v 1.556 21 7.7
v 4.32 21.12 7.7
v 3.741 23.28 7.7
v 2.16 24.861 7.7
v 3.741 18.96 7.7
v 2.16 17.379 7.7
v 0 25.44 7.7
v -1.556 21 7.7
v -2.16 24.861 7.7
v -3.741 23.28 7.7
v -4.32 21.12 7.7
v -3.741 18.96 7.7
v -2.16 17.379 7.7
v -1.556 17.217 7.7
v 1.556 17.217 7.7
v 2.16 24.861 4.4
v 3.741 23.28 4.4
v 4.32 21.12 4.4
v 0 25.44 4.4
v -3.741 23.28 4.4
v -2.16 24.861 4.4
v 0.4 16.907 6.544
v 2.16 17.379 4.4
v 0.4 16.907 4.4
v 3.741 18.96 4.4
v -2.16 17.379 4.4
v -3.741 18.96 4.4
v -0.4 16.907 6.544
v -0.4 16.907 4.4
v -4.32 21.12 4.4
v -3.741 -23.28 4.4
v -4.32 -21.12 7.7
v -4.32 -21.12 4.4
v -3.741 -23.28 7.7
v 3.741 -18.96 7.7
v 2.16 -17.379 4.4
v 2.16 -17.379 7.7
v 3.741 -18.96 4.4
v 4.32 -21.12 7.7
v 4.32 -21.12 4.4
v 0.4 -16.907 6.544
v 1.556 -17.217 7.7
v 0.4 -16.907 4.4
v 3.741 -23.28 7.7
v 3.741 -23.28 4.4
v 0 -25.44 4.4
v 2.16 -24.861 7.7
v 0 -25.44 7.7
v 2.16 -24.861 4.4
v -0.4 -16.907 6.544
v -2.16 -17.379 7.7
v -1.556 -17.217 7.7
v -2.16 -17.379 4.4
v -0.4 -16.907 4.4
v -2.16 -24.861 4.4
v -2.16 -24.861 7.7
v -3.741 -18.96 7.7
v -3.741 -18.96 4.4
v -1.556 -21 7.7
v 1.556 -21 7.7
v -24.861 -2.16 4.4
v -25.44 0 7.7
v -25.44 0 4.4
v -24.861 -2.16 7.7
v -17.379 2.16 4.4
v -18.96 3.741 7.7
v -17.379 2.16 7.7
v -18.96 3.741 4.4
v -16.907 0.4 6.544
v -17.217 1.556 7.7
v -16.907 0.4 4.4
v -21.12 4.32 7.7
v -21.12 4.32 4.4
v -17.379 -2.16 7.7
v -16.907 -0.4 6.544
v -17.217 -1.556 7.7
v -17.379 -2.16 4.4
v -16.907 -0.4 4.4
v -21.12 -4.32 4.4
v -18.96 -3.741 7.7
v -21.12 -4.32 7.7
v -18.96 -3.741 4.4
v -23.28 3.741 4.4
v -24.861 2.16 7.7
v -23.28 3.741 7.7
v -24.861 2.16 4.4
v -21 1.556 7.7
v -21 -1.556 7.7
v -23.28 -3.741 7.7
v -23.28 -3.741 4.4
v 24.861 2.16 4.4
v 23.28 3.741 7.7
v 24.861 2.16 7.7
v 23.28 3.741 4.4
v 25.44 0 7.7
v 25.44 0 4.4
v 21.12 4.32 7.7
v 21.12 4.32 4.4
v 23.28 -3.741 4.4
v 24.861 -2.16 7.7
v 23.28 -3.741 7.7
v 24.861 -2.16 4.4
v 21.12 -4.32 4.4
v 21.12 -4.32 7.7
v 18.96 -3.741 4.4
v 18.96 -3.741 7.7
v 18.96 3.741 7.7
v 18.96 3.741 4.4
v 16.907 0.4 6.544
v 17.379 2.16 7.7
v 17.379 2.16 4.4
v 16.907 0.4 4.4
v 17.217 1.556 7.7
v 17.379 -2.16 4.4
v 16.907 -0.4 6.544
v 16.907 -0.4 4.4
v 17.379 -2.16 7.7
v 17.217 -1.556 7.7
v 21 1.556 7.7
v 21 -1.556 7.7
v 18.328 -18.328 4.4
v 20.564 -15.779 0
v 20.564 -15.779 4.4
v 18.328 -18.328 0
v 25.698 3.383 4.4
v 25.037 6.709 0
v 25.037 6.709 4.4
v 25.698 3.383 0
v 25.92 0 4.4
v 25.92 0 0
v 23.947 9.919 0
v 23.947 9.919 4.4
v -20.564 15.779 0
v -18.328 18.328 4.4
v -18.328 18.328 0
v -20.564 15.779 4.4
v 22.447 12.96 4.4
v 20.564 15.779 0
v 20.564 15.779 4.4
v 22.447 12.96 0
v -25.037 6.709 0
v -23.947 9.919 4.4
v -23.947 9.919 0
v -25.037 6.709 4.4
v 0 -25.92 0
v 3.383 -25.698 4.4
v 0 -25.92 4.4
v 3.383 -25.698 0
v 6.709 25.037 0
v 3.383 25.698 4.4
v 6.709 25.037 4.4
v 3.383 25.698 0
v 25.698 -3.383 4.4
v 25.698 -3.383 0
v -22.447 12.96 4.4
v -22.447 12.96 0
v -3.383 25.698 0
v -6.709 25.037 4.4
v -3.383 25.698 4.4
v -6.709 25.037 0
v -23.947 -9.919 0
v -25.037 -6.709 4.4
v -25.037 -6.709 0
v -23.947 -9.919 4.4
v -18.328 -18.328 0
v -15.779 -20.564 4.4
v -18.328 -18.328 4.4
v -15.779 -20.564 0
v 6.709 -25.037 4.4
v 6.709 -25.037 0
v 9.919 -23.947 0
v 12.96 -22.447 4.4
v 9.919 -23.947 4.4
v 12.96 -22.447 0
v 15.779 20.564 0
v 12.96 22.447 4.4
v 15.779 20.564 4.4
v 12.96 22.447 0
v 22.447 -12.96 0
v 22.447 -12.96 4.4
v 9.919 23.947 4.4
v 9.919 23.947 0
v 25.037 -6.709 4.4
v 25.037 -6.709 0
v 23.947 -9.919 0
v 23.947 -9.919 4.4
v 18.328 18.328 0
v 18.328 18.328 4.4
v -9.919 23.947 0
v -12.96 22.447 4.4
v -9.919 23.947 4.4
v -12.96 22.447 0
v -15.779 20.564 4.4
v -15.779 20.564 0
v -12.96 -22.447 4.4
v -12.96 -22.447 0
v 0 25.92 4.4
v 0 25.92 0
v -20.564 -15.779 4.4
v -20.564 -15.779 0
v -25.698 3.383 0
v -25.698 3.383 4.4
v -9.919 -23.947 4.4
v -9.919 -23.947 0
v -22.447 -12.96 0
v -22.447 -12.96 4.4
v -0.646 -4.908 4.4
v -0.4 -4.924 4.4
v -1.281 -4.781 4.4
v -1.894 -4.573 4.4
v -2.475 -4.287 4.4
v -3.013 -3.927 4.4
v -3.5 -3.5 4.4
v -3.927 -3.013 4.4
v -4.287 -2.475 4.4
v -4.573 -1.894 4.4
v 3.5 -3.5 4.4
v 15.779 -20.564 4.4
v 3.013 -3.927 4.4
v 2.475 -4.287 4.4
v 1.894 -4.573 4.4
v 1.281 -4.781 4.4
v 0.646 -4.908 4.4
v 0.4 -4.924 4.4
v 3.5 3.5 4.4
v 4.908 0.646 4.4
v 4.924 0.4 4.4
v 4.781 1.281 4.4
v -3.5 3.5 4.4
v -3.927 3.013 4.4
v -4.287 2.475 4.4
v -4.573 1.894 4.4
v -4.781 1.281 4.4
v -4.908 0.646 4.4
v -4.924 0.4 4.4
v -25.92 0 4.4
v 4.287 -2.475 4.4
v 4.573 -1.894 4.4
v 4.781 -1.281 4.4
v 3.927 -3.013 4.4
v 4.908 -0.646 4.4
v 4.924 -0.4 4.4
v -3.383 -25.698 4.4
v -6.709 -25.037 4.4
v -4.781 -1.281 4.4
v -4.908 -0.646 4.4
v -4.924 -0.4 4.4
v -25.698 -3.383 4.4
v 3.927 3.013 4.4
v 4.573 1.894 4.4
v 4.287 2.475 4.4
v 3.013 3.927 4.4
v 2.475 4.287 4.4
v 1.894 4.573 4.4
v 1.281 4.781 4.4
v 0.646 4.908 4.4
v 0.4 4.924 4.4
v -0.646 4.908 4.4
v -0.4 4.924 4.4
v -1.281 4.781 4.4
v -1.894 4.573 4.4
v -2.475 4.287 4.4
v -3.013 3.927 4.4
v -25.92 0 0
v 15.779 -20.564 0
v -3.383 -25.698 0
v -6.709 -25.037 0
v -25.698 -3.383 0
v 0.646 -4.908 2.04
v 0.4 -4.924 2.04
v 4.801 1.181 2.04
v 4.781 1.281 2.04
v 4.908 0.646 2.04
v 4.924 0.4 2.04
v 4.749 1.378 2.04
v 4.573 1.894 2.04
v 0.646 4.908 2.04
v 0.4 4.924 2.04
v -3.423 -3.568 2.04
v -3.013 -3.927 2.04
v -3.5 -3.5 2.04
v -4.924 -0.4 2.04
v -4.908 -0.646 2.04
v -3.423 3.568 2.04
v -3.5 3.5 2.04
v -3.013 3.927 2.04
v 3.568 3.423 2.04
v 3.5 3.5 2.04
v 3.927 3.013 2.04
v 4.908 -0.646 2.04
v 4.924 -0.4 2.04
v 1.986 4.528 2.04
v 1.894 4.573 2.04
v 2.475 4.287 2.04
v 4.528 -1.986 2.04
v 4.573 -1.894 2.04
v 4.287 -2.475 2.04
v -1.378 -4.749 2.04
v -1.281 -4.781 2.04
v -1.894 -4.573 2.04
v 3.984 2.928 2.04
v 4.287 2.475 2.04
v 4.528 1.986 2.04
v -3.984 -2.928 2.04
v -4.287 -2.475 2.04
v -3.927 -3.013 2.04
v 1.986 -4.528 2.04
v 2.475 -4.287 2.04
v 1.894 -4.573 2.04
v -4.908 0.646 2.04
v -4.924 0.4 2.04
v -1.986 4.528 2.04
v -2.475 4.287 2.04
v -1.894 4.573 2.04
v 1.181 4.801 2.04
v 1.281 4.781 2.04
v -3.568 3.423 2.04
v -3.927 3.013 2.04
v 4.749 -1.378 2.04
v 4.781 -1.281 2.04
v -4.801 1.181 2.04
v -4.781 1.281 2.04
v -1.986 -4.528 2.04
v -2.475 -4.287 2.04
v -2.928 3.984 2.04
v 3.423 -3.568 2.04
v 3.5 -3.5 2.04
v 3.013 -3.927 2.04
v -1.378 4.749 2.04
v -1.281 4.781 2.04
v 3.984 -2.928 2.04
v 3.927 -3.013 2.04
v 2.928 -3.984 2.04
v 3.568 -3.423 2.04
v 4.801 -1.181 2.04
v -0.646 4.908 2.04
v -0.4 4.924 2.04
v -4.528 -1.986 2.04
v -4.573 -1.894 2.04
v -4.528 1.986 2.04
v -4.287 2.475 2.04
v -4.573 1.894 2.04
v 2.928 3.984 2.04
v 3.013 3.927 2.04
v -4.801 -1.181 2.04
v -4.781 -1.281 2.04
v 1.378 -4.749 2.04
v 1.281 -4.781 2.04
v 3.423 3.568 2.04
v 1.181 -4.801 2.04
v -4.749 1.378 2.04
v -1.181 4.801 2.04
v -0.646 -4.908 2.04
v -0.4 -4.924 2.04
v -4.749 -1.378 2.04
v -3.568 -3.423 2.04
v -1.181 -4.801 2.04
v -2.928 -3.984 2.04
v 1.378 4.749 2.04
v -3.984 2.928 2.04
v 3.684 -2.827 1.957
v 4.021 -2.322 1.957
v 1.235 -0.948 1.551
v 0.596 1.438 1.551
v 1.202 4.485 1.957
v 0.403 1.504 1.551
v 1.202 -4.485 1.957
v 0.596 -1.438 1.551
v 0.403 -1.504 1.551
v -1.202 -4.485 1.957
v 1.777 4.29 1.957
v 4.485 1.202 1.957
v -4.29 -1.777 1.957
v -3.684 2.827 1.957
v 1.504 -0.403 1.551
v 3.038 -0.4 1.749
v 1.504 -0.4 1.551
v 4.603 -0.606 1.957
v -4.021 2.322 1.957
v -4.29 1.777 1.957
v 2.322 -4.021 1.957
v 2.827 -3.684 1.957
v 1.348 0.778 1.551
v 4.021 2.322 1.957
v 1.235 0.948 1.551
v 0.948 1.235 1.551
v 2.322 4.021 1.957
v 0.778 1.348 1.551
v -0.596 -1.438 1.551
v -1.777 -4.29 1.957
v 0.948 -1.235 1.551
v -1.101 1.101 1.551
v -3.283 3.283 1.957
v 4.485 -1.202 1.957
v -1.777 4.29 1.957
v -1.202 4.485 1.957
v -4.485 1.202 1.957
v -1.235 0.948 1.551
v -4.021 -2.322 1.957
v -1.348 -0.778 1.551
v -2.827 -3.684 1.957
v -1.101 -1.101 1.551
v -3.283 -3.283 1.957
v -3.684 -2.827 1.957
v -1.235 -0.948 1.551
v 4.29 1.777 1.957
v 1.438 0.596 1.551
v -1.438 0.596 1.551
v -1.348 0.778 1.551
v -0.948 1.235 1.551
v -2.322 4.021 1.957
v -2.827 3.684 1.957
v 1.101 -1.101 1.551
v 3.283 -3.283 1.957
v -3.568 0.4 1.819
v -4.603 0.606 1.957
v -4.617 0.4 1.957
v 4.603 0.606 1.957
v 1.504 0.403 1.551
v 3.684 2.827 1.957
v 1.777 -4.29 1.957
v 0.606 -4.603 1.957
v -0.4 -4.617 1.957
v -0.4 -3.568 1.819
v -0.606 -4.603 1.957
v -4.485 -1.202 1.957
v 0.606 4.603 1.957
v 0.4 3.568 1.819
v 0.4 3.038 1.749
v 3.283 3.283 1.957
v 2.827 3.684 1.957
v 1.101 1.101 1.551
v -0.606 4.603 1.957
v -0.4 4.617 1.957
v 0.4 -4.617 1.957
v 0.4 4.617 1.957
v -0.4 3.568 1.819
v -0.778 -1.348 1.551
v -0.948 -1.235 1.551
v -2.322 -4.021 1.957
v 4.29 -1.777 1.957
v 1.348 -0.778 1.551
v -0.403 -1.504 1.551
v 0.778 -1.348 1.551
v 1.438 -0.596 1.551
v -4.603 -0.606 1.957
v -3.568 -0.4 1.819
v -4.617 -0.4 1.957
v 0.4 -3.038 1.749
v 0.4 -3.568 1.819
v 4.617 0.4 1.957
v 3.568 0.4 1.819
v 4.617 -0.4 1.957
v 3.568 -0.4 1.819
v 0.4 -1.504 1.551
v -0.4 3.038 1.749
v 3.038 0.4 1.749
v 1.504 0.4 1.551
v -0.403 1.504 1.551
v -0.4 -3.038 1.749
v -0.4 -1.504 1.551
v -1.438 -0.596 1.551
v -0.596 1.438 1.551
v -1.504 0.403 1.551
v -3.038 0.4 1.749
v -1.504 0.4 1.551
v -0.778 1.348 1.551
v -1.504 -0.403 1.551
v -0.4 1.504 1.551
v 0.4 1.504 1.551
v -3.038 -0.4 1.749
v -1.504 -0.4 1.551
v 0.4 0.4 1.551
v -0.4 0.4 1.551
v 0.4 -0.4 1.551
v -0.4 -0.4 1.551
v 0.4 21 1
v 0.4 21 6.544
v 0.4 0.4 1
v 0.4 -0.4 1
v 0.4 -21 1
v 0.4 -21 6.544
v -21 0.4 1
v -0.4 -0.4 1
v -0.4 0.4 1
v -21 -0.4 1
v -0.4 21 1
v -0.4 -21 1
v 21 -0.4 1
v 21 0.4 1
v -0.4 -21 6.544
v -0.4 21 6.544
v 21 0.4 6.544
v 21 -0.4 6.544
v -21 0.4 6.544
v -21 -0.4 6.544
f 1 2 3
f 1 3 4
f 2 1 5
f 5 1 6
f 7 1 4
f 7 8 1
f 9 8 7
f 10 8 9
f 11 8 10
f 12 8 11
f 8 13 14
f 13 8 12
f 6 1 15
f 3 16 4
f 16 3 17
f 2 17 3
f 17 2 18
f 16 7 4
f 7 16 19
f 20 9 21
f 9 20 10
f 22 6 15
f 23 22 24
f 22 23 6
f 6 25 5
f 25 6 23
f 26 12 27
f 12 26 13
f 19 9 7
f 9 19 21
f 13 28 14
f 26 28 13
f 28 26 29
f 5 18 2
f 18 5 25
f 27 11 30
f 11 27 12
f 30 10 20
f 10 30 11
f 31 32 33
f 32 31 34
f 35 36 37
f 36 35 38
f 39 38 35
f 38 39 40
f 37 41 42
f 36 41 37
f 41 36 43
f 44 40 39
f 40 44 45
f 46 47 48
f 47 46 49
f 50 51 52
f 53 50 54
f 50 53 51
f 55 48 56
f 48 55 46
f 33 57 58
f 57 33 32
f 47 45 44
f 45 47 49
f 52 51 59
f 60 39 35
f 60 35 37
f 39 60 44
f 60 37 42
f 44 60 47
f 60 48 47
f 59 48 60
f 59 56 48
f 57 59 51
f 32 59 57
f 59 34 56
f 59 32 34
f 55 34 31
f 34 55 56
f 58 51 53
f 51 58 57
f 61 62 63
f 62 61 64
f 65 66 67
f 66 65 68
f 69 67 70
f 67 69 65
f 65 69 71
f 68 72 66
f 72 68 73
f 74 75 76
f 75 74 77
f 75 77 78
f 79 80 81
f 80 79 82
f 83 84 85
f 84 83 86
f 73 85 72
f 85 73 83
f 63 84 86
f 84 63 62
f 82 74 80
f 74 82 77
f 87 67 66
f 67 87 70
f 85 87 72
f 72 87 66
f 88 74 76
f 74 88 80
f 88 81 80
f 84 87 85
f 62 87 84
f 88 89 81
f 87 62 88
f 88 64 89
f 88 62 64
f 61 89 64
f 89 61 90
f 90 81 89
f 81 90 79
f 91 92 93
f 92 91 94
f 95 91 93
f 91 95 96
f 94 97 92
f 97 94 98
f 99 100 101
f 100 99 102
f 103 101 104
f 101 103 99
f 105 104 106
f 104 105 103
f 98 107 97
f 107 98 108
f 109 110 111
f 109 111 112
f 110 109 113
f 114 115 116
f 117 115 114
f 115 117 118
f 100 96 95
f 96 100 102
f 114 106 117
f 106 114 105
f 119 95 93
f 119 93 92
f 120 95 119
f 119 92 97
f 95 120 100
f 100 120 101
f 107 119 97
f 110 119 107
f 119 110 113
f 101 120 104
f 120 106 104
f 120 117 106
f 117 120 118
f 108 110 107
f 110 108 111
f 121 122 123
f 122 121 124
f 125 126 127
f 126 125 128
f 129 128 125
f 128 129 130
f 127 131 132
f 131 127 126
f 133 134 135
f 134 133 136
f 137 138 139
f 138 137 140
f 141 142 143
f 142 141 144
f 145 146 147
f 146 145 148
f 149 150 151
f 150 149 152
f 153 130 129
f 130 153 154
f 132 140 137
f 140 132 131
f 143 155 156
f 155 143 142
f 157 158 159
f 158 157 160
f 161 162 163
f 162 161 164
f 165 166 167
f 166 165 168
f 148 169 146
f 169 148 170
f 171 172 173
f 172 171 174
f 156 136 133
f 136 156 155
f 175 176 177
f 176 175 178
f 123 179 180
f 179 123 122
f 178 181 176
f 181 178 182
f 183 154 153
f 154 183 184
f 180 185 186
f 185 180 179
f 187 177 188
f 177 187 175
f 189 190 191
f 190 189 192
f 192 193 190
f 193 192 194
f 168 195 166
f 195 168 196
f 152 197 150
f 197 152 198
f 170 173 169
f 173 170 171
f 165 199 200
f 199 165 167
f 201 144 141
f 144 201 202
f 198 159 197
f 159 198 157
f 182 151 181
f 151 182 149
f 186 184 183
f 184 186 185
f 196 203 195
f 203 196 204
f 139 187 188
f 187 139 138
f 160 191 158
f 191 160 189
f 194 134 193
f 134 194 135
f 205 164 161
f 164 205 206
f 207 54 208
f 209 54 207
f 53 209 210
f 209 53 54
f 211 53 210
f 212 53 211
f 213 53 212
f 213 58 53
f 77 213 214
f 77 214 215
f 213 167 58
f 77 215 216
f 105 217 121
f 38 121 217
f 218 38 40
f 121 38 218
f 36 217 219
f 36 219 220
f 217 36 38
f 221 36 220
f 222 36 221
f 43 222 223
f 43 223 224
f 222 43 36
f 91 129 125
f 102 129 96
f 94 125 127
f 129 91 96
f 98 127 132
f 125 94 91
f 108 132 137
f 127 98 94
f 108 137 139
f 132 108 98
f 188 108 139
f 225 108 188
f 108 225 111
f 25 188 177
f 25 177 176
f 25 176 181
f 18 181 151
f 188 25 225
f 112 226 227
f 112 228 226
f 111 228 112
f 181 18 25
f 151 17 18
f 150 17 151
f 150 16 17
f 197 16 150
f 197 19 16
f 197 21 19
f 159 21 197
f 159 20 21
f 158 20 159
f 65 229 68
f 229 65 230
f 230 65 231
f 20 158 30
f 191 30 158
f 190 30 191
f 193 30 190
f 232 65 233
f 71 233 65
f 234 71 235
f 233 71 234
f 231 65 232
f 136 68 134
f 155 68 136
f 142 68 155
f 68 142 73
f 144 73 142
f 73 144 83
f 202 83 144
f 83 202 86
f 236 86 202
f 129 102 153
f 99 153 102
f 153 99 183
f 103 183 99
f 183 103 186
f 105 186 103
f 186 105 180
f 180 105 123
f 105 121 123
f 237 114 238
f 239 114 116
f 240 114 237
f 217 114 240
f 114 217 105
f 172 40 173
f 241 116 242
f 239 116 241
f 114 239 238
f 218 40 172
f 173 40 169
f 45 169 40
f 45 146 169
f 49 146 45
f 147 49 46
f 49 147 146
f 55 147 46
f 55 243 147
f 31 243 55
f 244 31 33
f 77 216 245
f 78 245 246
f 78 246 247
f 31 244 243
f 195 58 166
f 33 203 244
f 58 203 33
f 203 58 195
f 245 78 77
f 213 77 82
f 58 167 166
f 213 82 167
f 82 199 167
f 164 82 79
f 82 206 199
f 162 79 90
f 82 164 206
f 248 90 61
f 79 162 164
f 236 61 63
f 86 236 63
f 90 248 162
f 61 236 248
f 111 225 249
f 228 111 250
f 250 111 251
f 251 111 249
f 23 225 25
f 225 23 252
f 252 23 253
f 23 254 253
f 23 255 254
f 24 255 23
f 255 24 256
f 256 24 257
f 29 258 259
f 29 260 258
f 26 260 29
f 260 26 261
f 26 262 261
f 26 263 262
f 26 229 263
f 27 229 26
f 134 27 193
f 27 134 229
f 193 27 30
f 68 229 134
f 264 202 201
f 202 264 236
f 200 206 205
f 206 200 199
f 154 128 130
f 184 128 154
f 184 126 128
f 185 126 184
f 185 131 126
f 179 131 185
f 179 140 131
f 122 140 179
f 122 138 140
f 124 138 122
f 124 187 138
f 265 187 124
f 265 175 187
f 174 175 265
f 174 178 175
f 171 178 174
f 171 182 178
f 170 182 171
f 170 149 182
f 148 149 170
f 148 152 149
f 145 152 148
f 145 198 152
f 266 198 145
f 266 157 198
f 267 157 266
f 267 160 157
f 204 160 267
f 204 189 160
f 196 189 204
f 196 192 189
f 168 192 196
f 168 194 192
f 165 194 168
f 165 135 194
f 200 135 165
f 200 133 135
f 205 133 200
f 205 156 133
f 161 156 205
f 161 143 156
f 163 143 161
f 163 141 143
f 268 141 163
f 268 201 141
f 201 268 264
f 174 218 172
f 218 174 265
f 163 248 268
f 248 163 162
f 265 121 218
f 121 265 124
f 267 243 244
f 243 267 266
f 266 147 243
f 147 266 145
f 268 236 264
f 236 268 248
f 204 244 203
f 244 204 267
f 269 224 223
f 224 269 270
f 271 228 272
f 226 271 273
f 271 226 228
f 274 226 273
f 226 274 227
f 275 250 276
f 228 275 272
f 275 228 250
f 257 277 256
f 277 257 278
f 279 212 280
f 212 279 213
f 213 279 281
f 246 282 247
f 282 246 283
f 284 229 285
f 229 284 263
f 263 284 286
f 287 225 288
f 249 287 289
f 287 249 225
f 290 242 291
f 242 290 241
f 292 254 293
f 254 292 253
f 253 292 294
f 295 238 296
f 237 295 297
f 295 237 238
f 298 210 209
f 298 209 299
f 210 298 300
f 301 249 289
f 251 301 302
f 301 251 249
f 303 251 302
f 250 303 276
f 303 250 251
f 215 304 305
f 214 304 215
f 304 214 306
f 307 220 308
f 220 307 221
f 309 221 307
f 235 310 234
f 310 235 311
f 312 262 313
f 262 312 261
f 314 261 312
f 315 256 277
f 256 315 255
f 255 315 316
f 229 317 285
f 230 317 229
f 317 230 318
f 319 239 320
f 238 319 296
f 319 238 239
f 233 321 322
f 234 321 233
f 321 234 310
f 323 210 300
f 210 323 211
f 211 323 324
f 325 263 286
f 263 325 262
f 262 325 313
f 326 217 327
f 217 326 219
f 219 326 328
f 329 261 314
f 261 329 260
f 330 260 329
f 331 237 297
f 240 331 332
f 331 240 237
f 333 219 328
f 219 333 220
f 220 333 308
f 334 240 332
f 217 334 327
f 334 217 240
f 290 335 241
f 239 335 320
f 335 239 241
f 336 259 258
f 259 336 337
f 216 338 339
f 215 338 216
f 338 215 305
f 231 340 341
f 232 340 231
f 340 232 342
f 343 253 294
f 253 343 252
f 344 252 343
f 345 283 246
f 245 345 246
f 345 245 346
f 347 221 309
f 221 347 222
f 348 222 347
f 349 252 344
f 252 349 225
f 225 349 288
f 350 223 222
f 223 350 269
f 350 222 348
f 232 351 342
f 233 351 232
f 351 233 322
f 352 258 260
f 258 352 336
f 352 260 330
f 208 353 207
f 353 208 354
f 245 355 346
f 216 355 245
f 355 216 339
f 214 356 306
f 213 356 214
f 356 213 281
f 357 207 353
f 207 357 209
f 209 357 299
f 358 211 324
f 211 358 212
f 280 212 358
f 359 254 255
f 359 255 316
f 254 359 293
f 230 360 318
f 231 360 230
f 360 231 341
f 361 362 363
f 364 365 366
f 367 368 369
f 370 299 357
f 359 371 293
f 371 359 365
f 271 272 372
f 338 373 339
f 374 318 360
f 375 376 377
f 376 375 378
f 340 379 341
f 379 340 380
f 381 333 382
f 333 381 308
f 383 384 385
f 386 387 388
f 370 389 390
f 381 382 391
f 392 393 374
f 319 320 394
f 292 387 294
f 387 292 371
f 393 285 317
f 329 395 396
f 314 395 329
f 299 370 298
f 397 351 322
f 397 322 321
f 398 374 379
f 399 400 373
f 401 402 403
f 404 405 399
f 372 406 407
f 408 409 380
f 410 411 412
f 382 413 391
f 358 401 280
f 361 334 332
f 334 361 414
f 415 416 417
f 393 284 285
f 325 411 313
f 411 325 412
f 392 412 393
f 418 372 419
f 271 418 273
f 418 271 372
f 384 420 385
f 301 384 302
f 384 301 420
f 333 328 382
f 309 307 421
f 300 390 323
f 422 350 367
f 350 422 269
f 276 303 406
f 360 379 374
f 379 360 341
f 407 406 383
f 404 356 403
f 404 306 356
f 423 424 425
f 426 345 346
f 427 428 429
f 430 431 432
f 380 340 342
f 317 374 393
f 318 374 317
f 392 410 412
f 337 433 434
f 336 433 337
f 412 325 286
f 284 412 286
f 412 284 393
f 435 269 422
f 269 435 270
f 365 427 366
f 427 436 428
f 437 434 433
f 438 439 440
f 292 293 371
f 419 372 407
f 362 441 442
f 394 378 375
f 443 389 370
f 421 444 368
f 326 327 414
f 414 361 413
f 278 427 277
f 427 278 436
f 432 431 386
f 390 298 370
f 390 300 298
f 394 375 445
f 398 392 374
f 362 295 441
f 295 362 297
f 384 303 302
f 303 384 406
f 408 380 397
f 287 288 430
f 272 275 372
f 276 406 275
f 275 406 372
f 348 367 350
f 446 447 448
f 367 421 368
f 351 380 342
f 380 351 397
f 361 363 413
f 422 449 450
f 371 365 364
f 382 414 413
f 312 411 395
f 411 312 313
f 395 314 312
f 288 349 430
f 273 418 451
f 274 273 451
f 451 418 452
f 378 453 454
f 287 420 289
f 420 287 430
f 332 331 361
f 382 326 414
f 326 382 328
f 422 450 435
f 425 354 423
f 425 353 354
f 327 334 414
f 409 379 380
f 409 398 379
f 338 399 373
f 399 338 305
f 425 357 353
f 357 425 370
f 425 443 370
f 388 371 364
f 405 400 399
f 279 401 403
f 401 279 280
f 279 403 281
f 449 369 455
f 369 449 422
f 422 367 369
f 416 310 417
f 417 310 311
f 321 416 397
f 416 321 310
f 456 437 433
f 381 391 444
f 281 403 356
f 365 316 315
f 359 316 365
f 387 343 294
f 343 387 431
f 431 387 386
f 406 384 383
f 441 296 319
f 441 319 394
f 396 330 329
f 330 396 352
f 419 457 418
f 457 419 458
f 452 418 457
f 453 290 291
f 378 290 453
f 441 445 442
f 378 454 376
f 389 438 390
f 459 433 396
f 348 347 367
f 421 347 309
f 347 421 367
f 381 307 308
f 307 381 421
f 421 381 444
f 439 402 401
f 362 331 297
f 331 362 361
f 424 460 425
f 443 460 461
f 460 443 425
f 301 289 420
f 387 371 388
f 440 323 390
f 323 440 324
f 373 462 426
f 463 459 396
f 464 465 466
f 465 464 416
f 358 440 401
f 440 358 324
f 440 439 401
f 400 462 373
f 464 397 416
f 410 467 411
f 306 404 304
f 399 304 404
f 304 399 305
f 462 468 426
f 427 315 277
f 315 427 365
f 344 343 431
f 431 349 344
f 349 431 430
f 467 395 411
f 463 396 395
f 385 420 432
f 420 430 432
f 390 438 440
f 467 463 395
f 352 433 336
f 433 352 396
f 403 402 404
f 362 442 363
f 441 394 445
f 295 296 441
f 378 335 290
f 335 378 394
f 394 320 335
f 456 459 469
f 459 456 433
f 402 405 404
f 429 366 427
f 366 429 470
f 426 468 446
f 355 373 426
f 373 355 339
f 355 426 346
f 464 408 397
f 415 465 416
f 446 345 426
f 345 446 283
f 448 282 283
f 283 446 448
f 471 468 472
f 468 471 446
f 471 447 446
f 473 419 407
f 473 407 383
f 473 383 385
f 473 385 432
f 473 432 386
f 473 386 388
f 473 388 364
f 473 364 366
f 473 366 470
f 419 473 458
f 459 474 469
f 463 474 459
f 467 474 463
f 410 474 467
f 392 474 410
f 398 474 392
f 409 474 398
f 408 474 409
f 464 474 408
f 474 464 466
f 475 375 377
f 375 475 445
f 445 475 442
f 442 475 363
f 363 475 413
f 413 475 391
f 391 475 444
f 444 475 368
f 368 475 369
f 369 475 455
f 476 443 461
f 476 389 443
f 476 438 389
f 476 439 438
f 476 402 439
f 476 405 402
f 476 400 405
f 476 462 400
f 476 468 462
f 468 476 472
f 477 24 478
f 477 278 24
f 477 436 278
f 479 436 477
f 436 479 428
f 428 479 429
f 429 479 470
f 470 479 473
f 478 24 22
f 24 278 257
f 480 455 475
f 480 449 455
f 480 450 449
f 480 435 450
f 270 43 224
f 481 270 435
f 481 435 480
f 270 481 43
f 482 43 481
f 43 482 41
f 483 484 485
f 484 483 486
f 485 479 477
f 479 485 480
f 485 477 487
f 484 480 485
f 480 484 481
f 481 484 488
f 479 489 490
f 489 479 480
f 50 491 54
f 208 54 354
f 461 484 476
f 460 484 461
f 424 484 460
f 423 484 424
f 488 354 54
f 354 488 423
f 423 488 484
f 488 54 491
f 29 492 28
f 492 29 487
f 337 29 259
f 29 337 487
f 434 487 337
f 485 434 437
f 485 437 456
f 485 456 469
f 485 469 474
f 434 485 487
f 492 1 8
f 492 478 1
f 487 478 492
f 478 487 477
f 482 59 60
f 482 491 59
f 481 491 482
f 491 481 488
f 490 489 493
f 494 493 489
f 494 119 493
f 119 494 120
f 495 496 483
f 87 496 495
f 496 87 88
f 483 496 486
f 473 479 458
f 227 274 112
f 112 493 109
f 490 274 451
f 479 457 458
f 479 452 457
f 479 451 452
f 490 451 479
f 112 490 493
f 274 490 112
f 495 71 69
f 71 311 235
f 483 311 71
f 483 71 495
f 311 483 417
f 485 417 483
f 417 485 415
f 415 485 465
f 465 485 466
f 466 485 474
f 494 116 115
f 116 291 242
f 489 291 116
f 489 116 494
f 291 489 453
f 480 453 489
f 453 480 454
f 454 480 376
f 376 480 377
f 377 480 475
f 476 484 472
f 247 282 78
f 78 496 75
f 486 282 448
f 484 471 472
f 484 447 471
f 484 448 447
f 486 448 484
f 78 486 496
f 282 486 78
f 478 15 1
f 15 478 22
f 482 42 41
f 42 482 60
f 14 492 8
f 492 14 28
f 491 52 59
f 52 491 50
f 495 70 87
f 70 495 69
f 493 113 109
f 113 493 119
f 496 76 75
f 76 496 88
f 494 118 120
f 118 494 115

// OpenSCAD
// [FL_INDEX: keywords="openscad, 3d_parametric, Pill_cutting_board, csg_solid" | COT="Parametric OpenSCAD design from 3DCodeverse"]
// Title: Pill cutting board

//Pill diameter
pd=9.6;//

//Pill hight1 
pt=4.2;//

//Pill hight2
pt2=2.6;

//Brade gap
bg=0.8;//

//Gap taper offset
gto=2.2; //

//Parts sellect
part="base";//[pill,base]  

pc=(pt-pt2)/2;//Convex value
sp=pd/(tan(2*atan(2*pc/pd))*2)+pd;// convex diameter

//Base hight
bh=pt2+(pt-pt2)/2+1;

echo(sp);// convex diameter
echo(pd+0.4);

module pill()
{
rotate([0,0,0])intersection(){
cylinder(h=20,r=pd/2+0.15,center=true,$fn=48);
translate([0,0,-sp+(pt2/2+0.2)])sphere(r=sp+0.2,center=true,$fn=48);
translate([0,0,sp-(pt2/2+0.2)])sphere(r=sp+0.2,center=true,$fn=48);
								}
}

module post2()
{
translate([0,pd*2.2,bh])cylinder(h=bh*1.5,r=pd*0.45 ,center=true,$fn=12);
translate([0,-pd*2.2,bh])cylinder(h=bh*1.5,r=pd*0.45 ,center=true,$fn=12);
translate([-pd*2.2,0,bh])cylinder(h=bh*1.5,r=pd*0.45 ,center=true,$fn=12);
translate([pd*2.2,0,bh])cylinder(h=bh*1.5,r=pd*0.45 ,center=true,$fn=12);
}

module post3()
{
translate([0,18,bh])cylinder(h=bh*2,r=pd*0.45 ,center=true,$fn=12);
translate([0,-18,bh])cylinder(h=bh*2,r=pd*0.45 ,center=true,$fn=12);
translate([-18,0,bh])cylinder(h=bh*2,r=pd*0.45 ,center=true,$fn=12);
translate([18,0,bh])cylinder(h=bh*2,r=pd*0.45 ,center=true,$fn=12);
}

if(part=="pill") {
		translate([0,0,0])pill();
				 }
else if (part=="base"){
	
	difference(){
			union(){ 
					translate([0,0,bh/2])cylinder(h=bh,r=pd*2.7 ,center=true,$fn=48);

					translate([0,0,0])post2();
					}
	translate([0,0,bh/2+1])pill();
	translate([0,0,bh])pill();
	translate([-bg/2,-21,1])cube(size=[bg,42,20], center=false);
	translate([-21,-bg/2,1])cube(size=[42,bg,20], center=false);
	translate([0,0,bh*gto])rotate([0,45,0])cube(size=[5,42,5], center=true);
	translate([0,0,bh*gto])rotate([45,0,0])cube(size=[42,5,5], center=true);
				}
						}
